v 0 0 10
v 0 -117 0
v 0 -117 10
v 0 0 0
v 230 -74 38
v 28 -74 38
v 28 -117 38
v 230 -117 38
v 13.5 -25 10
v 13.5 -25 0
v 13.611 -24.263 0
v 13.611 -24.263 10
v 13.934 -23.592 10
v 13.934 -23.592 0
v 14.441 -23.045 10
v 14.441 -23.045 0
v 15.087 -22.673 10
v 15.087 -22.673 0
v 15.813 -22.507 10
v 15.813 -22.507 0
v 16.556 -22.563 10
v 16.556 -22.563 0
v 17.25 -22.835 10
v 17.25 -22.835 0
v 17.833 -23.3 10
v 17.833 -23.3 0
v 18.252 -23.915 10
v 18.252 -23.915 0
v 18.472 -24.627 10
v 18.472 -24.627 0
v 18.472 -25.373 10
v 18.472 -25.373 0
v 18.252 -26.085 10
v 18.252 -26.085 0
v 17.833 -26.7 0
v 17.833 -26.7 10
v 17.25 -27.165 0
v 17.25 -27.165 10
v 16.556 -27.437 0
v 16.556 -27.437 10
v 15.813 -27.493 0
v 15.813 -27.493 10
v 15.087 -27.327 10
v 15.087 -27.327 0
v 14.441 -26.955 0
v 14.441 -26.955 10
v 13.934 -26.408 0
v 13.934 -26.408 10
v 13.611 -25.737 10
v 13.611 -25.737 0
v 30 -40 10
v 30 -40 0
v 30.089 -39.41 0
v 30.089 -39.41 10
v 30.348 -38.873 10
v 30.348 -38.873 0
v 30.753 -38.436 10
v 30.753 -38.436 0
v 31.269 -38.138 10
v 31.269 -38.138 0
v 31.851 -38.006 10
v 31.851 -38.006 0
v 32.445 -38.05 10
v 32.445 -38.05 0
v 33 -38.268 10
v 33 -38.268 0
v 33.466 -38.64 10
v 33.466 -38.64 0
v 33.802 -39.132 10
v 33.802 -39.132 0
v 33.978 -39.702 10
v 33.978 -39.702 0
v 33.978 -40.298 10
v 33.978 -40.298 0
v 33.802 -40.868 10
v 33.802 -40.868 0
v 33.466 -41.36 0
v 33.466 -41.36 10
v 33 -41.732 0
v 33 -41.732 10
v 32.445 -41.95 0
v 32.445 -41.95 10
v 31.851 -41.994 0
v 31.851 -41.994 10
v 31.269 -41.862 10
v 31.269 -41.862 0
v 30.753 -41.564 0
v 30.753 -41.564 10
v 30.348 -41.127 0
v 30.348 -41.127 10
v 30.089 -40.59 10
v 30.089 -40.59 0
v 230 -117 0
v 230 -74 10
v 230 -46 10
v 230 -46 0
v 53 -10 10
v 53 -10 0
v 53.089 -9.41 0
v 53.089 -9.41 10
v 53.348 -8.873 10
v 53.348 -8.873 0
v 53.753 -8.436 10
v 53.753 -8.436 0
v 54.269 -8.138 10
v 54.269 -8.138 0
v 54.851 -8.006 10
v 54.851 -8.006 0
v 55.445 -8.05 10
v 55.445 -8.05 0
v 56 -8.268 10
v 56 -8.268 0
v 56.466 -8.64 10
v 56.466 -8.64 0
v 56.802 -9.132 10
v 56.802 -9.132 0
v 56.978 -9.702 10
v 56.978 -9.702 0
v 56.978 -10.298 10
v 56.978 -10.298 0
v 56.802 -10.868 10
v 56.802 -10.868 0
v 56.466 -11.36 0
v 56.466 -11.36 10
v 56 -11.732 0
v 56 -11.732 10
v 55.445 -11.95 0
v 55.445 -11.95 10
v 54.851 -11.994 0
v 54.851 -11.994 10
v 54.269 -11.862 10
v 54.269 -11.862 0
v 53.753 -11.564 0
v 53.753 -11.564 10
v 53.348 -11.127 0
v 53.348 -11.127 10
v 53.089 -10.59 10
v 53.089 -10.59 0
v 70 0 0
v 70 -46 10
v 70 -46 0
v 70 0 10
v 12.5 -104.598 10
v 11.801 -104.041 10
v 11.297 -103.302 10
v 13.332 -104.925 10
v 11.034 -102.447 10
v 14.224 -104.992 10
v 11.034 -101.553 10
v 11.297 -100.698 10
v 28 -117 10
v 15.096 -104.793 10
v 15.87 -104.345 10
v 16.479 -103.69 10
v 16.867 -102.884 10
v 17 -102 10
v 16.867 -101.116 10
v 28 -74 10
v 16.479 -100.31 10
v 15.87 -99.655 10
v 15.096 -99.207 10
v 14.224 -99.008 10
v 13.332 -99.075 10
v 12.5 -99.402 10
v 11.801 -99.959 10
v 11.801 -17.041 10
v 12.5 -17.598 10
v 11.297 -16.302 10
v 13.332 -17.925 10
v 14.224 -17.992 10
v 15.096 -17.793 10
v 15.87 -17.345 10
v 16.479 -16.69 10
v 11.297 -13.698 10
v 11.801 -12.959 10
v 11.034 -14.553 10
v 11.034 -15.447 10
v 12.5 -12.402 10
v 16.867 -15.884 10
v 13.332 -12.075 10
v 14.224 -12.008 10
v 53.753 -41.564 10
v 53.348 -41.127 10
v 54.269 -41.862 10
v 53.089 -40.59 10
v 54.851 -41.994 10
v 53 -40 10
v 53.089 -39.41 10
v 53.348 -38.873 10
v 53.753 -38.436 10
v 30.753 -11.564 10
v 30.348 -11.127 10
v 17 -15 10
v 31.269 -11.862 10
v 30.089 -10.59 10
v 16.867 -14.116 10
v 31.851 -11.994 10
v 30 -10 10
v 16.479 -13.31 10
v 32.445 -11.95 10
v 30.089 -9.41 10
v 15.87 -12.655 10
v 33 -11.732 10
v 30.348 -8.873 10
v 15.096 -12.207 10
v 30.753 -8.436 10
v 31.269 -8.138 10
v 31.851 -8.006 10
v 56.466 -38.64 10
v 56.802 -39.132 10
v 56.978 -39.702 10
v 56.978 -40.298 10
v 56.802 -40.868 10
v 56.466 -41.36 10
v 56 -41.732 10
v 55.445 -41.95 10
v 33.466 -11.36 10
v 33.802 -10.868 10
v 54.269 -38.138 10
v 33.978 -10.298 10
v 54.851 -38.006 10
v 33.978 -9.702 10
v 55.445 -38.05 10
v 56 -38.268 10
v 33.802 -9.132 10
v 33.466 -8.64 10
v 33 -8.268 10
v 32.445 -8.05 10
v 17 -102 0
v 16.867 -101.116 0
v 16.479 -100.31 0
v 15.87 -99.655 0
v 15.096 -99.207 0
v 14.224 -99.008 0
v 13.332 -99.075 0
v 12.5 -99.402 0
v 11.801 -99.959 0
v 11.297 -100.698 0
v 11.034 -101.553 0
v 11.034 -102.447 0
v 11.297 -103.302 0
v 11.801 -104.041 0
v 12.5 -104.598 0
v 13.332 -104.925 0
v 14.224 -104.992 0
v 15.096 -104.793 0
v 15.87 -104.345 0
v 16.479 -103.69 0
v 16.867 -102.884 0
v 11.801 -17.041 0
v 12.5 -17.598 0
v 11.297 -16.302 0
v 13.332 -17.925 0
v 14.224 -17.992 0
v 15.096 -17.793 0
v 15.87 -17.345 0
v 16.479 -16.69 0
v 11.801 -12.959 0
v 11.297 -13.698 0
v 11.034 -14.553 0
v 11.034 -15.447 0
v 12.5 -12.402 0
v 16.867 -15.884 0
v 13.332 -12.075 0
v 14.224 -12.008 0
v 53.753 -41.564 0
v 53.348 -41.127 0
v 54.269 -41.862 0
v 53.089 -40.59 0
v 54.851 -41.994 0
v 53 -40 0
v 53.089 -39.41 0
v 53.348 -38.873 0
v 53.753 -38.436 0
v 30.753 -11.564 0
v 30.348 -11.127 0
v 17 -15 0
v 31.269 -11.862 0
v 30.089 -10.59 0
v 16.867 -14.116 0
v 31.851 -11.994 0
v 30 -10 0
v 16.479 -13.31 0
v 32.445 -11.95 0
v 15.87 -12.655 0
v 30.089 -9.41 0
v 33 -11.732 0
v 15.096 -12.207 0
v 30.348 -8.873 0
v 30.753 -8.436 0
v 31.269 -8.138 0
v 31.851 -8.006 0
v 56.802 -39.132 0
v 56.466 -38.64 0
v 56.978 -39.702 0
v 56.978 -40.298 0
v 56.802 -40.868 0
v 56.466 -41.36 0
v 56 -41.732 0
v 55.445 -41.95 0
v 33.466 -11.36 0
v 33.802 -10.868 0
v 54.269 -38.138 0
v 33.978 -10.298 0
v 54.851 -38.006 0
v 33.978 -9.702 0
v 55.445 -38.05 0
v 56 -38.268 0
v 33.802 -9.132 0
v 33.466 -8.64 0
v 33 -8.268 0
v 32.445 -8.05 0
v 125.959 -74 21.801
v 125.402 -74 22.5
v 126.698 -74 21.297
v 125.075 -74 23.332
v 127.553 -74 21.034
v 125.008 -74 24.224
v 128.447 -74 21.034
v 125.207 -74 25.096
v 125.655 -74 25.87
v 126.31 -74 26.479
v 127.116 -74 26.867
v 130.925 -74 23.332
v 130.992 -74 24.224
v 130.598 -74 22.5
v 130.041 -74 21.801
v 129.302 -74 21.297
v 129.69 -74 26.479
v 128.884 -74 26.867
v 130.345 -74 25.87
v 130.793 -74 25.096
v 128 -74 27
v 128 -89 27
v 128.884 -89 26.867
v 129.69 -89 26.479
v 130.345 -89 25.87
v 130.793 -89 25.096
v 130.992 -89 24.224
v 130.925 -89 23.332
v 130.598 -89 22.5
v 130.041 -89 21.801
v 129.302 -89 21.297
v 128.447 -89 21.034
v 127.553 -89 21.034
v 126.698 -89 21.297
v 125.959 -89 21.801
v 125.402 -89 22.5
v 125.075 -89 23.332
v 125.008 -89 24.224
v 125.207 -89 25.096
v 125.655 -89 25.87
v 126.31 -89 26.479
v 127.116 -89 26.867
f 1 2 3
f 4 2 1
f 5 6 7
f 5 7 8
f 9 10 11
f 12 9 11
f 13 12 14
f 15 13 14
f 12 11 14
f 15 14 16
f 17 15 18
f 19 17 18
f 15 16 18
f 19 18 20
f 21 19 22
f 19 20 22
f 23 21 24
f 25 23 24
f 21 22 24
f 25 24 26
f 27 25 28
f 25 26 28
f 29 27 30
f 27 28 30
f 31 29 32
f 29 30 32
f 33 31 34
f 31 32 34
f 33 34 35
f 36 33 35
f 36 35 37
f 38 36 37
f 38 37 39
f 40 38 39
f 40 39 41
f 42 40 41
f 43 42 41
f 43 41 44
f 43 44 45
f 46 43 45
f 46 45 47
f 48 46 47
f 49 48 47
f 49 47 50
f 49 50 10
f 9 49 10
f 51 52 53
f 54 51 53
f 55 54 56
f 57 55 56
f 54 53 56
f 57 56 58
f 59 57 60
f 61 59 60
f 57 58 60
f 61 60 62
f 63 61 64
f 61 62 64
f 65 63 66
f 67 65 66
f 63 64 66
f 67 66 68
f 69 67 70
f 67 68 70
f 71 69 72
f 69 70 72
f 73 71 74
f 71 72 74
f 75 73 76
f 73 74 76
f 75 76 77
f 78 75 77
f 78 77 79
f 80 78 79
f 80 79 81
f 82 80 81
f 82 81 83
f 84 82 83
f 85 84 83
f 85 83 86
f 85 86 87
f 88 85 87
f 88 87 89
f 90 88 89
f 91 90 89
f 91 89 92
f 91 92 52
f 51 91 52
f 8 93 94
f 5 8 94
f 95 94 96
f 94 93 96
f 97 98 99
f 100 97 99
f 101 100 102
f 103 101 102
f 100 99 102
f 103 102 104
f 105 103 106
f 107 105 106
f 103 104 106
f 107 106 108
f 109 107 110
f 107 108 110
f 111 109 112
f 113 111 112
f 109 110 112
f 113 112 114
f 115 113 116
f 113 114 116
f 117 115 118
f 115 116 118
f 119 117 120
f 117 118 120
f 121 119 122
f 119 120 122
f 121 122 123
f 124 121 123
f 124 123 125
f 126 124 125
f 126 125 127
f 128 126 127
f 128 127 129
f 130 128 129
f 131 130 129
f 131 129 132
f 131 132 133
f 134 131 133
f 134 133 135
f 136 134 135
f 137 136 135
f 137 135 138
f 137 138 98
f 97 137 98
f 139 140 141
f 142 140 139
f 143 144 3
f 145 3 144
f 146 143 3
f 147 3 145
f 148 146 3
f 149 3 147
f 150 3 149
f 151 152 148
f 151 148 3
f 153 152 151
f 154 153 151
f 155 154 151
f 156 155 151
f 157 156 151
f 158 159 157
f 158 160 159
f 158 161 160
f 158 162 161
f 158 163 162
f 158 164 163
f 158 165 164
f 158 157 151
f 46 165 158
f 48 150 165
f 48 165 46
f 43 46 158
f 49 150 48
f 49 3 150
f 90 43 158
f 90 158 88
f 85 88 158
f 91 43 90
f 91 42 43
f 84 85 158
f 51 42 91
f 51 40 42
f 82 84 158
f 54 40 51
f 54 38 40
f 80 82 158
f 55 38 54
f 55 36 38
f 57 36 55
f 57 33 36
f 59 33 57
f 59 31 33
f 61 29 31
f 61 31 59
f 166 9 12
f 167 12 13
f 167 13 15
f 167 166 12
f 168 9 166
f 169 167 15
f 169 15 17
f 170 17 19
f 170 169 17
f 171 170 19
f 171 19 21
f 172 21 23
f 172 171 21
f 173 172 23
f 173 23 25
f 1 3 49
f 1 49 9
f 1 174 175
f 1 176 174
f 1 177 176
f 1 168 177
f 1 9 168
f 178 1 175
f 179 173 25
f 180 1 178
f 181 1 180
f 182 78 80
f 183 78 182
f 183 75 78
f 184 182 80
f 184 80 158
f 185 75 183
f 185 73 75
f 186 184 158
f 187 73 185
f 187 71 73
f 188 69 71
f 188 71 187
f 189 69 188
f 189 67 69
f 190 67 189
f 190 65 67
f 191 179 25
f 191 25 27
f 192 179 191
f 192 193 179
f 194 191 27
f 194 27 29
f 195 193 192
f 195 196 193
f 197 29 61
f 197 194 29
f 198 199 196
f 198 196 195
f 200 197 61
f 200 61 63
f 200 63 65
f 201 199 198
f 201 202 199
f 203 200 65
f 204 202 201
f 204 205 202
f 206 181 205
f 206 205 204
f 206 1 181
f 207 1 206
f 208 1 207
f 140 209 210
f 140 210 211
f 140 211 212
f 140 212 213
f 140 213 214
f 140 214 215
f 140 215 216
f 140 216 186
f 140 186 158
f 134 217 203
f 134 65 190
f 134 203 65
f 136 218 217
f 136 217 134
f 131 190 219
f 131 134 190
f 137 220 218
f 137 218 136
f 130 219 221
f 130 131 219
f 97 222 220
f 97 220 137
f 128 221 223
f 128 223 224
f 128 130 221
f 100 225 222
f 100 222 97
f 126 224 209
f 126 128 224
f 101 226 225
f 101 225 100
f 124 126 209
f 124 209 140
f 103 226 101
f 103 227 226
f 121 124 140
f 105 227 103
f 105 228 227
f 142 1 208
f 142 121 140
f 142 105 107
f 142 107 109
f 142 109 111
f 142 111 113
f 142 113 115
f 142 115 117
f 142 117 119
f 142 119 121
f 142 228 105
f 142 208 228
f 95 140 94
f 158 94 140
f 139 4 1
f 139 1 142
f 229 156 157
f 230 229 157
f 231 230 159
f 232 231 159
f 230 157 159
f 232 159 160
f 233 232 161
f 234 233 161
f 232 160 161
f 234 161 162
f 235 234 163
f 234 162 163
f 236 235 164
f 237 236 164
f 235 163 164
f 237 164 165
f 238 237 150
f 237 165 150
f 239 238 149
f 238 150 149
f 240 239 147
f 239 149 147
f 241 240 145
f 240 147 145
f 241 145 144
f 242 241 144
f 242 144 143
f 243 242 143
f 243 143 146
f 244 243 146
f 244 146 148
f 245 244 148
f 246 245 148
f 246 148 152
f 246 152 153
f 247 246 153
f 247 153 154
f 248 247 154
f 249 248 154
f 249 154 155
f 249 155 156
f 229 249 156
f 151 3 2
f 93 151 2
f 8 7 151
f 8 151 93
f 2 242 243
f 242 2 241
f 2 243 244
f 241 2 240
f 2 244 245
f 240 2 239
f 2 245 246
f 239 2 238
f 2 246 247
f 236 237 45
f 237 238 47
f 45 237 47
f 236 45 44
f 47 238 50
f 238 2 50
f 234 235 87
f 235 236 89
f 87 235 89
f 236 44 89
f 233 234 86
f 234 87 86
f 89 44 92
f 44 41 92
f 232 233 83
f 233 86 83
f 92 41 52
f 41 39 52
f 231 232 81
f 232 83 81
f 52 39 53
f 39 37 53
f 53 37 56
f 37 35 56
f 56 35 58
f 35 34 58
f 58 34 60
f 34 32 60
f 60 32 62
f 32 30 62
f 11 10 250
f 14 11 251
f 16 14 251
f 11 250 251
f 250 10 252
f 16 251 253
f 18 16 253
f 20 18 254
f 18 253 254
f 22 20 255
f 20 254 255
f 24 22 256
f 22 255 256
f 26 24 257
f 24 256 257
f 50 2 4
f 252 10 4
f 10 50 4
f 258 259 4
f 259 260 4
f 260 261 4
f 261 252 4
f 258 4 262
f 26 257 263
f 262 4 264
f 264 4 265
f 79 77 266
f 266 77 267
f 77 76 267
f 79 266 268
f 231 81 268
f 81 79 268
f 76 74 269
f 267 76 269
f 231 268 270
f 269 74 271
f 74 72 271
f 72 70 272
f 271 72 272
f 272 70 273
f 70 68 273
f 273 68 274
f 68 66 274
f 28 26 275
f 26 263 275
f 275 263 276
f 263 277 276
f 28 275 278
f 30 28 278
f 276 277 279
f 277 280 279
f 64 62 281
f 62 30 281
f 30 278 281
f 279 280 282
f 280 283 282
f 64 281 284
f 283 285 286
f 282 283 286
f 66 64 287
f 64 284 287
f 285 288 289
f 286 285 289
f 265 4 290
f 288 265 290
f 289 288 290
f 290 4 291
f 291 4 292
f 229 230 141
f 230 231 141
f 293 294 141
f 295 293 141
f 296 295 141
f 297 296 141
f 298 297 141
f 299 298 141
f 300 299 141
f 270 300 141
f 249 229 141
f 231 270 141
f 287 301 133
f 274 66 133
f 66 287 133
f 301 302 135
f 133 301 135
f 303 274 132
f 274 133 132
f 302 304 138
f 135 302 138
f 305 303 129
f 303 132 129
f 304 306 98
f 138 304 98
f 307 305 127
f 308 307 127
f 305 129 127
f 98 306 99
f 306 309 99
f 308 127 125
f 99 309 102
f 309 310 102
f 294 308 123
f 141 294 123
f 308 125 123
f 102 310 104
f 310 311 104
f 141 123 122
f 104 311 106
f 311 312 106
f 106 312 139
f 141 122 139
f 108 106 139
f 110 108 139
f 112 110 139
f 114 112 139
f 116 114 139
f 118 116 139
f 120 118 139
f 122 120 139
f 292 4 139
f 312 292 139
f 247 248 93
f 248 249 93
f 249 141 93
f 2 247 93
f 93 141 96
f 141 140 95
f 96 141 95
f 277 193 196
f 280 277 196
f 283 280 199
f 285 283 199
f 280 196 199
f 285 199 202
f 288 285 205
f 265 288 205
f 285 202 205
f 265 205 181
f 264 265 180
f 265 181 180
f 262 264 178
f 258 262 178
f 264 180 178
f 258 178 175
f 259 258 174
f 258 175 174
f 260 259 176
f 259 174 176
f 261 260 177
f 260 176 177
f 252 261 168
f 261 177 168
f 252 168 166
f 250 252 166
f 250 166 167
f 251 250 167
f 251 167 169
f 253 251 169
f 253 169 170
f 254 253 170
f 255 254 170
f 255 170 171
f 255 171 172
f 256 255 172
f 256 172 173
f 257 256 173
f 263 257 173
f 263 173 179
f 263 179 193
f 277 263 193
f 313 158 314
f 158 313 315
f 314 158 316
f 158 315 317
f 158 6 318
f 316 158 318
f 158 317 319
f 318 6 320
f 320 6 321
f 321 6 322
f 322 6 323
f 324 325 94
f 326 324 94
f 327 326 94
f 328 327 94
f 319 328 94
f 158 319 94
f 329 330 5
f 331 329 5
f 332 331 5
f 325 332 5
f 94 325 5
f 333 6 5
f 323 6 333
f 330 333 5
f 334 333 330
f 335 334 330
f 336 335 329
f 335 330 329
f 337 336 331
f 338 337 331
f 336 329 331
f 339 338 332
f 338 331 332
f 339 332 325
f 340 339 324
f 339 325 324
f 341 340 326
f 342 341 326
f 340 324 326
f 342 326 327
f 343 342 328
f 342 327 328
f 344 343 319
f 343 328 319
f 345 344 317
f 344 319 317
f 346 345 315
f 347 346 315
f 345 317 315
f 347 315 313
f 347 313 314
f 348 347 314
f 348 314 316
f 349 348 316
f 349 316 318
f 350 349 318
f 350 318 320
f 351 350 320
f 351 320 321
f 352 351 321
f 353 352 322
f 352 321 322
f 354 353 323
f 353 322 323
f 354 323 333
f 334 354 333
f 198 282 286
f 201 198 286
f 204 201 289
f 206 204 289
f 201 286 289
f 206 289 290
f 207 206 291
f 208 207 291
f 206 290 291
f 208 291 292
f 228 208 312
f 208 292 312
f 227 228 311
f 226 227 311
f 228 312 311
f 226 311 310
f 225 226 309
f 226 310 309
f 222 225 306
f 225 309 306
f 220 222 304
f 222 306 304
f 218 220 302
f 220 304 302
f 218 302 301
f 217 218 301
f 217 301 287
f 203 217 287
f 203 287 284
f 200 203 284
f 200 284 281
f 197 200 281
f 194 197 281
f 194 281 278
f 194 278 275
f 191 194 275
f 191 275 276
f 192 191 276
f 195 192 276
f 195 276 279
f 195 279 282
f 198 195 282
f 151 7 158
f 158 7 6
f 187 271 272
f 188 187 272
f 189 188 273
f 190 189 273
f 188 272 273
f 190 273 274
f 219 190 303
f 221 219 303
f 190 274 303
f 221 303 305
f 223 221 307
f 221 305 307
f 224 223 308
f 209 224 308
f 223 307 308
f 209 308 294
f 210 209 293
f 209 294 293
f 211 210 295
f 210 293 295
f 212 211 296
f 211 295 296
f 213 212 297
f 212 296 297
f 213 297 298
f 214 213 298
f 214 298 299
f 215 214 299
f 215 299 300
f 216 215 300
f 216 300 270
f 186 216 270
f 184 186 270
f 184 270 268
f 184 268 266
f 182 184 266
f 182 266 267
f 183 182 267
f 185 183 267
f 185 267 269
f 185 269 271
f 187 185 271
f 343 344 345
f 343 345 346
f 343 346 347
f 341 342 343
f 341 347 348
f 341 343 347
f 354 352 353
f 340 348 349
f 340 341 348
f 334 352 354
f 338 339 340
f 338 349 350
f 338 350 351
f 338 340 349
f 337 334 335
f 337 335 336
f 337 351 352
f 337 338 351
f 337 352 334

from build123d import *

# Parameters (mm, degrees)
SKETCH2_W           = 230
SKETCH2_H           = 120
BOSS_EXTRUDE1_DEPTH = 38
CUT_EXTRUDE1_DEPTH  = 28
SKETCH4_W           = 160
SKETCH4_H           = 46
CUT_EXTRUDE2_DEPTH  = 261.929109147
SKETCH5_W           = 311.823210218
SKETCH5_H           = 28.846030915
CUT_EXTRUDE3_DEPTH  = 72
SKETCH6_R           = 3
CUT_EXTRUDE4_DEPTH  = 15
SKETCH7_R           = 3
CUT_EXTRUDE5_DEPTH  = 260.563094449
SKETCH8_R           = 2
CUT_EXTRUDE6_DEPTH  = 261.831363145
SKETCH9_R           = 2.5
CUT_EXTRUDE7_DEPTH  = 261.831363145


with BuildPart() as part:
    # Sketch2 → Boss-Extrude1 (new body)
    with BuildSketch(Plane.XY):
        with Locations((115, -60)):
            Rectangle(SKETCH2_W, SKETCH2_H)
    extrude(amount=BOSS_EXTRUDE1_DEPTH)

    # Sketch3 → Cut-Extrude1 (cut)
    with BuildSketch(Plane.XY.offset(38)):
        Polygon((28, -120), (28, -74), (230, -74), (230, 0), (0, 0), (0, -120), align=None)
    extrude(amount=-CUT_EXTRUDE1_DEPTH, mode=Mode.SUBTRACT)

    # Sketch4 → Cut-Extrude2 (cut, through all)
    with BuildSketch(Plane.XY.offset(10)):
        with Locations((150, -23)):
            Rectangle(SKETCH4_W, SKETCH4_H)
    extrude(amount=-CUT_EXTRUDE2_DEPTH, mode=Mode.SUBTRACT)

    # Sketch5 → Cut-Extrude3 (cut)
    with BuildSketch(Plane.XY.offset(38)):
        with Locations((110.708854905, -131.423015458)):
            Rectangle(SKETCH5_W, SKETCH5_H)
    extrude(amount=-CUT_EXTRUDE3_DEPTH, mode=Mode.SUBTRACT)

    # Sketch6 → Cut-Extrude4 (cut)
    with BuildSketch(Plane(origin=(0, -74, 0), x_dir=(1, 0, 0), z_dir=(0, 1, 0))):
        with Locations(Location((128, -24, 0), (0, 0, 270))):
            Circle(SKETCH6_R)
    extrude(amount=-CUT_EXTRUDE4_DEPTH, mode=Mode.SUBTRACT)

    # Sketch7 → Cut-Extrude5 (cut, through all)
    with BuildSketch(Plane.XY.offset(10)):
        with Locations((14, -15)):
            Circle(SKETCH7_R)
        with Locations((14, -102)):
            Circle(SKETCH7_R)
    extrude(amount=-CUT_EXTRUDE5_DEPTH, mode=Mode.SUBTRACT)

    # Sketch8 → Cut-Extrude6 (cut, through all)
    with BuildSketch(Plane(origin=(0, 0, 0), x_dir=(-1, 0, 0), z_dir=(0, 0, -1))):
        with Locations((-55, -10)):
            Circle(SKETCH8_R)
        with Locations((-55, -40)):
            Circle(SKETCH8_R)
        with Locations((-32, -40)):
            Circle(SKETCH8_R)
        with Locations((-32, -10)):
            Circle(SKETCH8_R)
    extrude(amount=-CUT_EXTRUDE6_DEPTH, mode=Mode.SUBTRACT)

    # Sketch9 → Cut-Extrude7 (cut, through all)
    with BuildSketch(Plane(origin=(0, 0, 0), x_dir=(-1, 0, 0), z_dir=(0, 0, -1))):
        with Locations((-16, -25)):
            Circle(SKETCH9_R)
    extrude(amount=-CUT_EXTRUDE7_DEPTH, mode=Mode.SUBTRACT)


solid = part.part
